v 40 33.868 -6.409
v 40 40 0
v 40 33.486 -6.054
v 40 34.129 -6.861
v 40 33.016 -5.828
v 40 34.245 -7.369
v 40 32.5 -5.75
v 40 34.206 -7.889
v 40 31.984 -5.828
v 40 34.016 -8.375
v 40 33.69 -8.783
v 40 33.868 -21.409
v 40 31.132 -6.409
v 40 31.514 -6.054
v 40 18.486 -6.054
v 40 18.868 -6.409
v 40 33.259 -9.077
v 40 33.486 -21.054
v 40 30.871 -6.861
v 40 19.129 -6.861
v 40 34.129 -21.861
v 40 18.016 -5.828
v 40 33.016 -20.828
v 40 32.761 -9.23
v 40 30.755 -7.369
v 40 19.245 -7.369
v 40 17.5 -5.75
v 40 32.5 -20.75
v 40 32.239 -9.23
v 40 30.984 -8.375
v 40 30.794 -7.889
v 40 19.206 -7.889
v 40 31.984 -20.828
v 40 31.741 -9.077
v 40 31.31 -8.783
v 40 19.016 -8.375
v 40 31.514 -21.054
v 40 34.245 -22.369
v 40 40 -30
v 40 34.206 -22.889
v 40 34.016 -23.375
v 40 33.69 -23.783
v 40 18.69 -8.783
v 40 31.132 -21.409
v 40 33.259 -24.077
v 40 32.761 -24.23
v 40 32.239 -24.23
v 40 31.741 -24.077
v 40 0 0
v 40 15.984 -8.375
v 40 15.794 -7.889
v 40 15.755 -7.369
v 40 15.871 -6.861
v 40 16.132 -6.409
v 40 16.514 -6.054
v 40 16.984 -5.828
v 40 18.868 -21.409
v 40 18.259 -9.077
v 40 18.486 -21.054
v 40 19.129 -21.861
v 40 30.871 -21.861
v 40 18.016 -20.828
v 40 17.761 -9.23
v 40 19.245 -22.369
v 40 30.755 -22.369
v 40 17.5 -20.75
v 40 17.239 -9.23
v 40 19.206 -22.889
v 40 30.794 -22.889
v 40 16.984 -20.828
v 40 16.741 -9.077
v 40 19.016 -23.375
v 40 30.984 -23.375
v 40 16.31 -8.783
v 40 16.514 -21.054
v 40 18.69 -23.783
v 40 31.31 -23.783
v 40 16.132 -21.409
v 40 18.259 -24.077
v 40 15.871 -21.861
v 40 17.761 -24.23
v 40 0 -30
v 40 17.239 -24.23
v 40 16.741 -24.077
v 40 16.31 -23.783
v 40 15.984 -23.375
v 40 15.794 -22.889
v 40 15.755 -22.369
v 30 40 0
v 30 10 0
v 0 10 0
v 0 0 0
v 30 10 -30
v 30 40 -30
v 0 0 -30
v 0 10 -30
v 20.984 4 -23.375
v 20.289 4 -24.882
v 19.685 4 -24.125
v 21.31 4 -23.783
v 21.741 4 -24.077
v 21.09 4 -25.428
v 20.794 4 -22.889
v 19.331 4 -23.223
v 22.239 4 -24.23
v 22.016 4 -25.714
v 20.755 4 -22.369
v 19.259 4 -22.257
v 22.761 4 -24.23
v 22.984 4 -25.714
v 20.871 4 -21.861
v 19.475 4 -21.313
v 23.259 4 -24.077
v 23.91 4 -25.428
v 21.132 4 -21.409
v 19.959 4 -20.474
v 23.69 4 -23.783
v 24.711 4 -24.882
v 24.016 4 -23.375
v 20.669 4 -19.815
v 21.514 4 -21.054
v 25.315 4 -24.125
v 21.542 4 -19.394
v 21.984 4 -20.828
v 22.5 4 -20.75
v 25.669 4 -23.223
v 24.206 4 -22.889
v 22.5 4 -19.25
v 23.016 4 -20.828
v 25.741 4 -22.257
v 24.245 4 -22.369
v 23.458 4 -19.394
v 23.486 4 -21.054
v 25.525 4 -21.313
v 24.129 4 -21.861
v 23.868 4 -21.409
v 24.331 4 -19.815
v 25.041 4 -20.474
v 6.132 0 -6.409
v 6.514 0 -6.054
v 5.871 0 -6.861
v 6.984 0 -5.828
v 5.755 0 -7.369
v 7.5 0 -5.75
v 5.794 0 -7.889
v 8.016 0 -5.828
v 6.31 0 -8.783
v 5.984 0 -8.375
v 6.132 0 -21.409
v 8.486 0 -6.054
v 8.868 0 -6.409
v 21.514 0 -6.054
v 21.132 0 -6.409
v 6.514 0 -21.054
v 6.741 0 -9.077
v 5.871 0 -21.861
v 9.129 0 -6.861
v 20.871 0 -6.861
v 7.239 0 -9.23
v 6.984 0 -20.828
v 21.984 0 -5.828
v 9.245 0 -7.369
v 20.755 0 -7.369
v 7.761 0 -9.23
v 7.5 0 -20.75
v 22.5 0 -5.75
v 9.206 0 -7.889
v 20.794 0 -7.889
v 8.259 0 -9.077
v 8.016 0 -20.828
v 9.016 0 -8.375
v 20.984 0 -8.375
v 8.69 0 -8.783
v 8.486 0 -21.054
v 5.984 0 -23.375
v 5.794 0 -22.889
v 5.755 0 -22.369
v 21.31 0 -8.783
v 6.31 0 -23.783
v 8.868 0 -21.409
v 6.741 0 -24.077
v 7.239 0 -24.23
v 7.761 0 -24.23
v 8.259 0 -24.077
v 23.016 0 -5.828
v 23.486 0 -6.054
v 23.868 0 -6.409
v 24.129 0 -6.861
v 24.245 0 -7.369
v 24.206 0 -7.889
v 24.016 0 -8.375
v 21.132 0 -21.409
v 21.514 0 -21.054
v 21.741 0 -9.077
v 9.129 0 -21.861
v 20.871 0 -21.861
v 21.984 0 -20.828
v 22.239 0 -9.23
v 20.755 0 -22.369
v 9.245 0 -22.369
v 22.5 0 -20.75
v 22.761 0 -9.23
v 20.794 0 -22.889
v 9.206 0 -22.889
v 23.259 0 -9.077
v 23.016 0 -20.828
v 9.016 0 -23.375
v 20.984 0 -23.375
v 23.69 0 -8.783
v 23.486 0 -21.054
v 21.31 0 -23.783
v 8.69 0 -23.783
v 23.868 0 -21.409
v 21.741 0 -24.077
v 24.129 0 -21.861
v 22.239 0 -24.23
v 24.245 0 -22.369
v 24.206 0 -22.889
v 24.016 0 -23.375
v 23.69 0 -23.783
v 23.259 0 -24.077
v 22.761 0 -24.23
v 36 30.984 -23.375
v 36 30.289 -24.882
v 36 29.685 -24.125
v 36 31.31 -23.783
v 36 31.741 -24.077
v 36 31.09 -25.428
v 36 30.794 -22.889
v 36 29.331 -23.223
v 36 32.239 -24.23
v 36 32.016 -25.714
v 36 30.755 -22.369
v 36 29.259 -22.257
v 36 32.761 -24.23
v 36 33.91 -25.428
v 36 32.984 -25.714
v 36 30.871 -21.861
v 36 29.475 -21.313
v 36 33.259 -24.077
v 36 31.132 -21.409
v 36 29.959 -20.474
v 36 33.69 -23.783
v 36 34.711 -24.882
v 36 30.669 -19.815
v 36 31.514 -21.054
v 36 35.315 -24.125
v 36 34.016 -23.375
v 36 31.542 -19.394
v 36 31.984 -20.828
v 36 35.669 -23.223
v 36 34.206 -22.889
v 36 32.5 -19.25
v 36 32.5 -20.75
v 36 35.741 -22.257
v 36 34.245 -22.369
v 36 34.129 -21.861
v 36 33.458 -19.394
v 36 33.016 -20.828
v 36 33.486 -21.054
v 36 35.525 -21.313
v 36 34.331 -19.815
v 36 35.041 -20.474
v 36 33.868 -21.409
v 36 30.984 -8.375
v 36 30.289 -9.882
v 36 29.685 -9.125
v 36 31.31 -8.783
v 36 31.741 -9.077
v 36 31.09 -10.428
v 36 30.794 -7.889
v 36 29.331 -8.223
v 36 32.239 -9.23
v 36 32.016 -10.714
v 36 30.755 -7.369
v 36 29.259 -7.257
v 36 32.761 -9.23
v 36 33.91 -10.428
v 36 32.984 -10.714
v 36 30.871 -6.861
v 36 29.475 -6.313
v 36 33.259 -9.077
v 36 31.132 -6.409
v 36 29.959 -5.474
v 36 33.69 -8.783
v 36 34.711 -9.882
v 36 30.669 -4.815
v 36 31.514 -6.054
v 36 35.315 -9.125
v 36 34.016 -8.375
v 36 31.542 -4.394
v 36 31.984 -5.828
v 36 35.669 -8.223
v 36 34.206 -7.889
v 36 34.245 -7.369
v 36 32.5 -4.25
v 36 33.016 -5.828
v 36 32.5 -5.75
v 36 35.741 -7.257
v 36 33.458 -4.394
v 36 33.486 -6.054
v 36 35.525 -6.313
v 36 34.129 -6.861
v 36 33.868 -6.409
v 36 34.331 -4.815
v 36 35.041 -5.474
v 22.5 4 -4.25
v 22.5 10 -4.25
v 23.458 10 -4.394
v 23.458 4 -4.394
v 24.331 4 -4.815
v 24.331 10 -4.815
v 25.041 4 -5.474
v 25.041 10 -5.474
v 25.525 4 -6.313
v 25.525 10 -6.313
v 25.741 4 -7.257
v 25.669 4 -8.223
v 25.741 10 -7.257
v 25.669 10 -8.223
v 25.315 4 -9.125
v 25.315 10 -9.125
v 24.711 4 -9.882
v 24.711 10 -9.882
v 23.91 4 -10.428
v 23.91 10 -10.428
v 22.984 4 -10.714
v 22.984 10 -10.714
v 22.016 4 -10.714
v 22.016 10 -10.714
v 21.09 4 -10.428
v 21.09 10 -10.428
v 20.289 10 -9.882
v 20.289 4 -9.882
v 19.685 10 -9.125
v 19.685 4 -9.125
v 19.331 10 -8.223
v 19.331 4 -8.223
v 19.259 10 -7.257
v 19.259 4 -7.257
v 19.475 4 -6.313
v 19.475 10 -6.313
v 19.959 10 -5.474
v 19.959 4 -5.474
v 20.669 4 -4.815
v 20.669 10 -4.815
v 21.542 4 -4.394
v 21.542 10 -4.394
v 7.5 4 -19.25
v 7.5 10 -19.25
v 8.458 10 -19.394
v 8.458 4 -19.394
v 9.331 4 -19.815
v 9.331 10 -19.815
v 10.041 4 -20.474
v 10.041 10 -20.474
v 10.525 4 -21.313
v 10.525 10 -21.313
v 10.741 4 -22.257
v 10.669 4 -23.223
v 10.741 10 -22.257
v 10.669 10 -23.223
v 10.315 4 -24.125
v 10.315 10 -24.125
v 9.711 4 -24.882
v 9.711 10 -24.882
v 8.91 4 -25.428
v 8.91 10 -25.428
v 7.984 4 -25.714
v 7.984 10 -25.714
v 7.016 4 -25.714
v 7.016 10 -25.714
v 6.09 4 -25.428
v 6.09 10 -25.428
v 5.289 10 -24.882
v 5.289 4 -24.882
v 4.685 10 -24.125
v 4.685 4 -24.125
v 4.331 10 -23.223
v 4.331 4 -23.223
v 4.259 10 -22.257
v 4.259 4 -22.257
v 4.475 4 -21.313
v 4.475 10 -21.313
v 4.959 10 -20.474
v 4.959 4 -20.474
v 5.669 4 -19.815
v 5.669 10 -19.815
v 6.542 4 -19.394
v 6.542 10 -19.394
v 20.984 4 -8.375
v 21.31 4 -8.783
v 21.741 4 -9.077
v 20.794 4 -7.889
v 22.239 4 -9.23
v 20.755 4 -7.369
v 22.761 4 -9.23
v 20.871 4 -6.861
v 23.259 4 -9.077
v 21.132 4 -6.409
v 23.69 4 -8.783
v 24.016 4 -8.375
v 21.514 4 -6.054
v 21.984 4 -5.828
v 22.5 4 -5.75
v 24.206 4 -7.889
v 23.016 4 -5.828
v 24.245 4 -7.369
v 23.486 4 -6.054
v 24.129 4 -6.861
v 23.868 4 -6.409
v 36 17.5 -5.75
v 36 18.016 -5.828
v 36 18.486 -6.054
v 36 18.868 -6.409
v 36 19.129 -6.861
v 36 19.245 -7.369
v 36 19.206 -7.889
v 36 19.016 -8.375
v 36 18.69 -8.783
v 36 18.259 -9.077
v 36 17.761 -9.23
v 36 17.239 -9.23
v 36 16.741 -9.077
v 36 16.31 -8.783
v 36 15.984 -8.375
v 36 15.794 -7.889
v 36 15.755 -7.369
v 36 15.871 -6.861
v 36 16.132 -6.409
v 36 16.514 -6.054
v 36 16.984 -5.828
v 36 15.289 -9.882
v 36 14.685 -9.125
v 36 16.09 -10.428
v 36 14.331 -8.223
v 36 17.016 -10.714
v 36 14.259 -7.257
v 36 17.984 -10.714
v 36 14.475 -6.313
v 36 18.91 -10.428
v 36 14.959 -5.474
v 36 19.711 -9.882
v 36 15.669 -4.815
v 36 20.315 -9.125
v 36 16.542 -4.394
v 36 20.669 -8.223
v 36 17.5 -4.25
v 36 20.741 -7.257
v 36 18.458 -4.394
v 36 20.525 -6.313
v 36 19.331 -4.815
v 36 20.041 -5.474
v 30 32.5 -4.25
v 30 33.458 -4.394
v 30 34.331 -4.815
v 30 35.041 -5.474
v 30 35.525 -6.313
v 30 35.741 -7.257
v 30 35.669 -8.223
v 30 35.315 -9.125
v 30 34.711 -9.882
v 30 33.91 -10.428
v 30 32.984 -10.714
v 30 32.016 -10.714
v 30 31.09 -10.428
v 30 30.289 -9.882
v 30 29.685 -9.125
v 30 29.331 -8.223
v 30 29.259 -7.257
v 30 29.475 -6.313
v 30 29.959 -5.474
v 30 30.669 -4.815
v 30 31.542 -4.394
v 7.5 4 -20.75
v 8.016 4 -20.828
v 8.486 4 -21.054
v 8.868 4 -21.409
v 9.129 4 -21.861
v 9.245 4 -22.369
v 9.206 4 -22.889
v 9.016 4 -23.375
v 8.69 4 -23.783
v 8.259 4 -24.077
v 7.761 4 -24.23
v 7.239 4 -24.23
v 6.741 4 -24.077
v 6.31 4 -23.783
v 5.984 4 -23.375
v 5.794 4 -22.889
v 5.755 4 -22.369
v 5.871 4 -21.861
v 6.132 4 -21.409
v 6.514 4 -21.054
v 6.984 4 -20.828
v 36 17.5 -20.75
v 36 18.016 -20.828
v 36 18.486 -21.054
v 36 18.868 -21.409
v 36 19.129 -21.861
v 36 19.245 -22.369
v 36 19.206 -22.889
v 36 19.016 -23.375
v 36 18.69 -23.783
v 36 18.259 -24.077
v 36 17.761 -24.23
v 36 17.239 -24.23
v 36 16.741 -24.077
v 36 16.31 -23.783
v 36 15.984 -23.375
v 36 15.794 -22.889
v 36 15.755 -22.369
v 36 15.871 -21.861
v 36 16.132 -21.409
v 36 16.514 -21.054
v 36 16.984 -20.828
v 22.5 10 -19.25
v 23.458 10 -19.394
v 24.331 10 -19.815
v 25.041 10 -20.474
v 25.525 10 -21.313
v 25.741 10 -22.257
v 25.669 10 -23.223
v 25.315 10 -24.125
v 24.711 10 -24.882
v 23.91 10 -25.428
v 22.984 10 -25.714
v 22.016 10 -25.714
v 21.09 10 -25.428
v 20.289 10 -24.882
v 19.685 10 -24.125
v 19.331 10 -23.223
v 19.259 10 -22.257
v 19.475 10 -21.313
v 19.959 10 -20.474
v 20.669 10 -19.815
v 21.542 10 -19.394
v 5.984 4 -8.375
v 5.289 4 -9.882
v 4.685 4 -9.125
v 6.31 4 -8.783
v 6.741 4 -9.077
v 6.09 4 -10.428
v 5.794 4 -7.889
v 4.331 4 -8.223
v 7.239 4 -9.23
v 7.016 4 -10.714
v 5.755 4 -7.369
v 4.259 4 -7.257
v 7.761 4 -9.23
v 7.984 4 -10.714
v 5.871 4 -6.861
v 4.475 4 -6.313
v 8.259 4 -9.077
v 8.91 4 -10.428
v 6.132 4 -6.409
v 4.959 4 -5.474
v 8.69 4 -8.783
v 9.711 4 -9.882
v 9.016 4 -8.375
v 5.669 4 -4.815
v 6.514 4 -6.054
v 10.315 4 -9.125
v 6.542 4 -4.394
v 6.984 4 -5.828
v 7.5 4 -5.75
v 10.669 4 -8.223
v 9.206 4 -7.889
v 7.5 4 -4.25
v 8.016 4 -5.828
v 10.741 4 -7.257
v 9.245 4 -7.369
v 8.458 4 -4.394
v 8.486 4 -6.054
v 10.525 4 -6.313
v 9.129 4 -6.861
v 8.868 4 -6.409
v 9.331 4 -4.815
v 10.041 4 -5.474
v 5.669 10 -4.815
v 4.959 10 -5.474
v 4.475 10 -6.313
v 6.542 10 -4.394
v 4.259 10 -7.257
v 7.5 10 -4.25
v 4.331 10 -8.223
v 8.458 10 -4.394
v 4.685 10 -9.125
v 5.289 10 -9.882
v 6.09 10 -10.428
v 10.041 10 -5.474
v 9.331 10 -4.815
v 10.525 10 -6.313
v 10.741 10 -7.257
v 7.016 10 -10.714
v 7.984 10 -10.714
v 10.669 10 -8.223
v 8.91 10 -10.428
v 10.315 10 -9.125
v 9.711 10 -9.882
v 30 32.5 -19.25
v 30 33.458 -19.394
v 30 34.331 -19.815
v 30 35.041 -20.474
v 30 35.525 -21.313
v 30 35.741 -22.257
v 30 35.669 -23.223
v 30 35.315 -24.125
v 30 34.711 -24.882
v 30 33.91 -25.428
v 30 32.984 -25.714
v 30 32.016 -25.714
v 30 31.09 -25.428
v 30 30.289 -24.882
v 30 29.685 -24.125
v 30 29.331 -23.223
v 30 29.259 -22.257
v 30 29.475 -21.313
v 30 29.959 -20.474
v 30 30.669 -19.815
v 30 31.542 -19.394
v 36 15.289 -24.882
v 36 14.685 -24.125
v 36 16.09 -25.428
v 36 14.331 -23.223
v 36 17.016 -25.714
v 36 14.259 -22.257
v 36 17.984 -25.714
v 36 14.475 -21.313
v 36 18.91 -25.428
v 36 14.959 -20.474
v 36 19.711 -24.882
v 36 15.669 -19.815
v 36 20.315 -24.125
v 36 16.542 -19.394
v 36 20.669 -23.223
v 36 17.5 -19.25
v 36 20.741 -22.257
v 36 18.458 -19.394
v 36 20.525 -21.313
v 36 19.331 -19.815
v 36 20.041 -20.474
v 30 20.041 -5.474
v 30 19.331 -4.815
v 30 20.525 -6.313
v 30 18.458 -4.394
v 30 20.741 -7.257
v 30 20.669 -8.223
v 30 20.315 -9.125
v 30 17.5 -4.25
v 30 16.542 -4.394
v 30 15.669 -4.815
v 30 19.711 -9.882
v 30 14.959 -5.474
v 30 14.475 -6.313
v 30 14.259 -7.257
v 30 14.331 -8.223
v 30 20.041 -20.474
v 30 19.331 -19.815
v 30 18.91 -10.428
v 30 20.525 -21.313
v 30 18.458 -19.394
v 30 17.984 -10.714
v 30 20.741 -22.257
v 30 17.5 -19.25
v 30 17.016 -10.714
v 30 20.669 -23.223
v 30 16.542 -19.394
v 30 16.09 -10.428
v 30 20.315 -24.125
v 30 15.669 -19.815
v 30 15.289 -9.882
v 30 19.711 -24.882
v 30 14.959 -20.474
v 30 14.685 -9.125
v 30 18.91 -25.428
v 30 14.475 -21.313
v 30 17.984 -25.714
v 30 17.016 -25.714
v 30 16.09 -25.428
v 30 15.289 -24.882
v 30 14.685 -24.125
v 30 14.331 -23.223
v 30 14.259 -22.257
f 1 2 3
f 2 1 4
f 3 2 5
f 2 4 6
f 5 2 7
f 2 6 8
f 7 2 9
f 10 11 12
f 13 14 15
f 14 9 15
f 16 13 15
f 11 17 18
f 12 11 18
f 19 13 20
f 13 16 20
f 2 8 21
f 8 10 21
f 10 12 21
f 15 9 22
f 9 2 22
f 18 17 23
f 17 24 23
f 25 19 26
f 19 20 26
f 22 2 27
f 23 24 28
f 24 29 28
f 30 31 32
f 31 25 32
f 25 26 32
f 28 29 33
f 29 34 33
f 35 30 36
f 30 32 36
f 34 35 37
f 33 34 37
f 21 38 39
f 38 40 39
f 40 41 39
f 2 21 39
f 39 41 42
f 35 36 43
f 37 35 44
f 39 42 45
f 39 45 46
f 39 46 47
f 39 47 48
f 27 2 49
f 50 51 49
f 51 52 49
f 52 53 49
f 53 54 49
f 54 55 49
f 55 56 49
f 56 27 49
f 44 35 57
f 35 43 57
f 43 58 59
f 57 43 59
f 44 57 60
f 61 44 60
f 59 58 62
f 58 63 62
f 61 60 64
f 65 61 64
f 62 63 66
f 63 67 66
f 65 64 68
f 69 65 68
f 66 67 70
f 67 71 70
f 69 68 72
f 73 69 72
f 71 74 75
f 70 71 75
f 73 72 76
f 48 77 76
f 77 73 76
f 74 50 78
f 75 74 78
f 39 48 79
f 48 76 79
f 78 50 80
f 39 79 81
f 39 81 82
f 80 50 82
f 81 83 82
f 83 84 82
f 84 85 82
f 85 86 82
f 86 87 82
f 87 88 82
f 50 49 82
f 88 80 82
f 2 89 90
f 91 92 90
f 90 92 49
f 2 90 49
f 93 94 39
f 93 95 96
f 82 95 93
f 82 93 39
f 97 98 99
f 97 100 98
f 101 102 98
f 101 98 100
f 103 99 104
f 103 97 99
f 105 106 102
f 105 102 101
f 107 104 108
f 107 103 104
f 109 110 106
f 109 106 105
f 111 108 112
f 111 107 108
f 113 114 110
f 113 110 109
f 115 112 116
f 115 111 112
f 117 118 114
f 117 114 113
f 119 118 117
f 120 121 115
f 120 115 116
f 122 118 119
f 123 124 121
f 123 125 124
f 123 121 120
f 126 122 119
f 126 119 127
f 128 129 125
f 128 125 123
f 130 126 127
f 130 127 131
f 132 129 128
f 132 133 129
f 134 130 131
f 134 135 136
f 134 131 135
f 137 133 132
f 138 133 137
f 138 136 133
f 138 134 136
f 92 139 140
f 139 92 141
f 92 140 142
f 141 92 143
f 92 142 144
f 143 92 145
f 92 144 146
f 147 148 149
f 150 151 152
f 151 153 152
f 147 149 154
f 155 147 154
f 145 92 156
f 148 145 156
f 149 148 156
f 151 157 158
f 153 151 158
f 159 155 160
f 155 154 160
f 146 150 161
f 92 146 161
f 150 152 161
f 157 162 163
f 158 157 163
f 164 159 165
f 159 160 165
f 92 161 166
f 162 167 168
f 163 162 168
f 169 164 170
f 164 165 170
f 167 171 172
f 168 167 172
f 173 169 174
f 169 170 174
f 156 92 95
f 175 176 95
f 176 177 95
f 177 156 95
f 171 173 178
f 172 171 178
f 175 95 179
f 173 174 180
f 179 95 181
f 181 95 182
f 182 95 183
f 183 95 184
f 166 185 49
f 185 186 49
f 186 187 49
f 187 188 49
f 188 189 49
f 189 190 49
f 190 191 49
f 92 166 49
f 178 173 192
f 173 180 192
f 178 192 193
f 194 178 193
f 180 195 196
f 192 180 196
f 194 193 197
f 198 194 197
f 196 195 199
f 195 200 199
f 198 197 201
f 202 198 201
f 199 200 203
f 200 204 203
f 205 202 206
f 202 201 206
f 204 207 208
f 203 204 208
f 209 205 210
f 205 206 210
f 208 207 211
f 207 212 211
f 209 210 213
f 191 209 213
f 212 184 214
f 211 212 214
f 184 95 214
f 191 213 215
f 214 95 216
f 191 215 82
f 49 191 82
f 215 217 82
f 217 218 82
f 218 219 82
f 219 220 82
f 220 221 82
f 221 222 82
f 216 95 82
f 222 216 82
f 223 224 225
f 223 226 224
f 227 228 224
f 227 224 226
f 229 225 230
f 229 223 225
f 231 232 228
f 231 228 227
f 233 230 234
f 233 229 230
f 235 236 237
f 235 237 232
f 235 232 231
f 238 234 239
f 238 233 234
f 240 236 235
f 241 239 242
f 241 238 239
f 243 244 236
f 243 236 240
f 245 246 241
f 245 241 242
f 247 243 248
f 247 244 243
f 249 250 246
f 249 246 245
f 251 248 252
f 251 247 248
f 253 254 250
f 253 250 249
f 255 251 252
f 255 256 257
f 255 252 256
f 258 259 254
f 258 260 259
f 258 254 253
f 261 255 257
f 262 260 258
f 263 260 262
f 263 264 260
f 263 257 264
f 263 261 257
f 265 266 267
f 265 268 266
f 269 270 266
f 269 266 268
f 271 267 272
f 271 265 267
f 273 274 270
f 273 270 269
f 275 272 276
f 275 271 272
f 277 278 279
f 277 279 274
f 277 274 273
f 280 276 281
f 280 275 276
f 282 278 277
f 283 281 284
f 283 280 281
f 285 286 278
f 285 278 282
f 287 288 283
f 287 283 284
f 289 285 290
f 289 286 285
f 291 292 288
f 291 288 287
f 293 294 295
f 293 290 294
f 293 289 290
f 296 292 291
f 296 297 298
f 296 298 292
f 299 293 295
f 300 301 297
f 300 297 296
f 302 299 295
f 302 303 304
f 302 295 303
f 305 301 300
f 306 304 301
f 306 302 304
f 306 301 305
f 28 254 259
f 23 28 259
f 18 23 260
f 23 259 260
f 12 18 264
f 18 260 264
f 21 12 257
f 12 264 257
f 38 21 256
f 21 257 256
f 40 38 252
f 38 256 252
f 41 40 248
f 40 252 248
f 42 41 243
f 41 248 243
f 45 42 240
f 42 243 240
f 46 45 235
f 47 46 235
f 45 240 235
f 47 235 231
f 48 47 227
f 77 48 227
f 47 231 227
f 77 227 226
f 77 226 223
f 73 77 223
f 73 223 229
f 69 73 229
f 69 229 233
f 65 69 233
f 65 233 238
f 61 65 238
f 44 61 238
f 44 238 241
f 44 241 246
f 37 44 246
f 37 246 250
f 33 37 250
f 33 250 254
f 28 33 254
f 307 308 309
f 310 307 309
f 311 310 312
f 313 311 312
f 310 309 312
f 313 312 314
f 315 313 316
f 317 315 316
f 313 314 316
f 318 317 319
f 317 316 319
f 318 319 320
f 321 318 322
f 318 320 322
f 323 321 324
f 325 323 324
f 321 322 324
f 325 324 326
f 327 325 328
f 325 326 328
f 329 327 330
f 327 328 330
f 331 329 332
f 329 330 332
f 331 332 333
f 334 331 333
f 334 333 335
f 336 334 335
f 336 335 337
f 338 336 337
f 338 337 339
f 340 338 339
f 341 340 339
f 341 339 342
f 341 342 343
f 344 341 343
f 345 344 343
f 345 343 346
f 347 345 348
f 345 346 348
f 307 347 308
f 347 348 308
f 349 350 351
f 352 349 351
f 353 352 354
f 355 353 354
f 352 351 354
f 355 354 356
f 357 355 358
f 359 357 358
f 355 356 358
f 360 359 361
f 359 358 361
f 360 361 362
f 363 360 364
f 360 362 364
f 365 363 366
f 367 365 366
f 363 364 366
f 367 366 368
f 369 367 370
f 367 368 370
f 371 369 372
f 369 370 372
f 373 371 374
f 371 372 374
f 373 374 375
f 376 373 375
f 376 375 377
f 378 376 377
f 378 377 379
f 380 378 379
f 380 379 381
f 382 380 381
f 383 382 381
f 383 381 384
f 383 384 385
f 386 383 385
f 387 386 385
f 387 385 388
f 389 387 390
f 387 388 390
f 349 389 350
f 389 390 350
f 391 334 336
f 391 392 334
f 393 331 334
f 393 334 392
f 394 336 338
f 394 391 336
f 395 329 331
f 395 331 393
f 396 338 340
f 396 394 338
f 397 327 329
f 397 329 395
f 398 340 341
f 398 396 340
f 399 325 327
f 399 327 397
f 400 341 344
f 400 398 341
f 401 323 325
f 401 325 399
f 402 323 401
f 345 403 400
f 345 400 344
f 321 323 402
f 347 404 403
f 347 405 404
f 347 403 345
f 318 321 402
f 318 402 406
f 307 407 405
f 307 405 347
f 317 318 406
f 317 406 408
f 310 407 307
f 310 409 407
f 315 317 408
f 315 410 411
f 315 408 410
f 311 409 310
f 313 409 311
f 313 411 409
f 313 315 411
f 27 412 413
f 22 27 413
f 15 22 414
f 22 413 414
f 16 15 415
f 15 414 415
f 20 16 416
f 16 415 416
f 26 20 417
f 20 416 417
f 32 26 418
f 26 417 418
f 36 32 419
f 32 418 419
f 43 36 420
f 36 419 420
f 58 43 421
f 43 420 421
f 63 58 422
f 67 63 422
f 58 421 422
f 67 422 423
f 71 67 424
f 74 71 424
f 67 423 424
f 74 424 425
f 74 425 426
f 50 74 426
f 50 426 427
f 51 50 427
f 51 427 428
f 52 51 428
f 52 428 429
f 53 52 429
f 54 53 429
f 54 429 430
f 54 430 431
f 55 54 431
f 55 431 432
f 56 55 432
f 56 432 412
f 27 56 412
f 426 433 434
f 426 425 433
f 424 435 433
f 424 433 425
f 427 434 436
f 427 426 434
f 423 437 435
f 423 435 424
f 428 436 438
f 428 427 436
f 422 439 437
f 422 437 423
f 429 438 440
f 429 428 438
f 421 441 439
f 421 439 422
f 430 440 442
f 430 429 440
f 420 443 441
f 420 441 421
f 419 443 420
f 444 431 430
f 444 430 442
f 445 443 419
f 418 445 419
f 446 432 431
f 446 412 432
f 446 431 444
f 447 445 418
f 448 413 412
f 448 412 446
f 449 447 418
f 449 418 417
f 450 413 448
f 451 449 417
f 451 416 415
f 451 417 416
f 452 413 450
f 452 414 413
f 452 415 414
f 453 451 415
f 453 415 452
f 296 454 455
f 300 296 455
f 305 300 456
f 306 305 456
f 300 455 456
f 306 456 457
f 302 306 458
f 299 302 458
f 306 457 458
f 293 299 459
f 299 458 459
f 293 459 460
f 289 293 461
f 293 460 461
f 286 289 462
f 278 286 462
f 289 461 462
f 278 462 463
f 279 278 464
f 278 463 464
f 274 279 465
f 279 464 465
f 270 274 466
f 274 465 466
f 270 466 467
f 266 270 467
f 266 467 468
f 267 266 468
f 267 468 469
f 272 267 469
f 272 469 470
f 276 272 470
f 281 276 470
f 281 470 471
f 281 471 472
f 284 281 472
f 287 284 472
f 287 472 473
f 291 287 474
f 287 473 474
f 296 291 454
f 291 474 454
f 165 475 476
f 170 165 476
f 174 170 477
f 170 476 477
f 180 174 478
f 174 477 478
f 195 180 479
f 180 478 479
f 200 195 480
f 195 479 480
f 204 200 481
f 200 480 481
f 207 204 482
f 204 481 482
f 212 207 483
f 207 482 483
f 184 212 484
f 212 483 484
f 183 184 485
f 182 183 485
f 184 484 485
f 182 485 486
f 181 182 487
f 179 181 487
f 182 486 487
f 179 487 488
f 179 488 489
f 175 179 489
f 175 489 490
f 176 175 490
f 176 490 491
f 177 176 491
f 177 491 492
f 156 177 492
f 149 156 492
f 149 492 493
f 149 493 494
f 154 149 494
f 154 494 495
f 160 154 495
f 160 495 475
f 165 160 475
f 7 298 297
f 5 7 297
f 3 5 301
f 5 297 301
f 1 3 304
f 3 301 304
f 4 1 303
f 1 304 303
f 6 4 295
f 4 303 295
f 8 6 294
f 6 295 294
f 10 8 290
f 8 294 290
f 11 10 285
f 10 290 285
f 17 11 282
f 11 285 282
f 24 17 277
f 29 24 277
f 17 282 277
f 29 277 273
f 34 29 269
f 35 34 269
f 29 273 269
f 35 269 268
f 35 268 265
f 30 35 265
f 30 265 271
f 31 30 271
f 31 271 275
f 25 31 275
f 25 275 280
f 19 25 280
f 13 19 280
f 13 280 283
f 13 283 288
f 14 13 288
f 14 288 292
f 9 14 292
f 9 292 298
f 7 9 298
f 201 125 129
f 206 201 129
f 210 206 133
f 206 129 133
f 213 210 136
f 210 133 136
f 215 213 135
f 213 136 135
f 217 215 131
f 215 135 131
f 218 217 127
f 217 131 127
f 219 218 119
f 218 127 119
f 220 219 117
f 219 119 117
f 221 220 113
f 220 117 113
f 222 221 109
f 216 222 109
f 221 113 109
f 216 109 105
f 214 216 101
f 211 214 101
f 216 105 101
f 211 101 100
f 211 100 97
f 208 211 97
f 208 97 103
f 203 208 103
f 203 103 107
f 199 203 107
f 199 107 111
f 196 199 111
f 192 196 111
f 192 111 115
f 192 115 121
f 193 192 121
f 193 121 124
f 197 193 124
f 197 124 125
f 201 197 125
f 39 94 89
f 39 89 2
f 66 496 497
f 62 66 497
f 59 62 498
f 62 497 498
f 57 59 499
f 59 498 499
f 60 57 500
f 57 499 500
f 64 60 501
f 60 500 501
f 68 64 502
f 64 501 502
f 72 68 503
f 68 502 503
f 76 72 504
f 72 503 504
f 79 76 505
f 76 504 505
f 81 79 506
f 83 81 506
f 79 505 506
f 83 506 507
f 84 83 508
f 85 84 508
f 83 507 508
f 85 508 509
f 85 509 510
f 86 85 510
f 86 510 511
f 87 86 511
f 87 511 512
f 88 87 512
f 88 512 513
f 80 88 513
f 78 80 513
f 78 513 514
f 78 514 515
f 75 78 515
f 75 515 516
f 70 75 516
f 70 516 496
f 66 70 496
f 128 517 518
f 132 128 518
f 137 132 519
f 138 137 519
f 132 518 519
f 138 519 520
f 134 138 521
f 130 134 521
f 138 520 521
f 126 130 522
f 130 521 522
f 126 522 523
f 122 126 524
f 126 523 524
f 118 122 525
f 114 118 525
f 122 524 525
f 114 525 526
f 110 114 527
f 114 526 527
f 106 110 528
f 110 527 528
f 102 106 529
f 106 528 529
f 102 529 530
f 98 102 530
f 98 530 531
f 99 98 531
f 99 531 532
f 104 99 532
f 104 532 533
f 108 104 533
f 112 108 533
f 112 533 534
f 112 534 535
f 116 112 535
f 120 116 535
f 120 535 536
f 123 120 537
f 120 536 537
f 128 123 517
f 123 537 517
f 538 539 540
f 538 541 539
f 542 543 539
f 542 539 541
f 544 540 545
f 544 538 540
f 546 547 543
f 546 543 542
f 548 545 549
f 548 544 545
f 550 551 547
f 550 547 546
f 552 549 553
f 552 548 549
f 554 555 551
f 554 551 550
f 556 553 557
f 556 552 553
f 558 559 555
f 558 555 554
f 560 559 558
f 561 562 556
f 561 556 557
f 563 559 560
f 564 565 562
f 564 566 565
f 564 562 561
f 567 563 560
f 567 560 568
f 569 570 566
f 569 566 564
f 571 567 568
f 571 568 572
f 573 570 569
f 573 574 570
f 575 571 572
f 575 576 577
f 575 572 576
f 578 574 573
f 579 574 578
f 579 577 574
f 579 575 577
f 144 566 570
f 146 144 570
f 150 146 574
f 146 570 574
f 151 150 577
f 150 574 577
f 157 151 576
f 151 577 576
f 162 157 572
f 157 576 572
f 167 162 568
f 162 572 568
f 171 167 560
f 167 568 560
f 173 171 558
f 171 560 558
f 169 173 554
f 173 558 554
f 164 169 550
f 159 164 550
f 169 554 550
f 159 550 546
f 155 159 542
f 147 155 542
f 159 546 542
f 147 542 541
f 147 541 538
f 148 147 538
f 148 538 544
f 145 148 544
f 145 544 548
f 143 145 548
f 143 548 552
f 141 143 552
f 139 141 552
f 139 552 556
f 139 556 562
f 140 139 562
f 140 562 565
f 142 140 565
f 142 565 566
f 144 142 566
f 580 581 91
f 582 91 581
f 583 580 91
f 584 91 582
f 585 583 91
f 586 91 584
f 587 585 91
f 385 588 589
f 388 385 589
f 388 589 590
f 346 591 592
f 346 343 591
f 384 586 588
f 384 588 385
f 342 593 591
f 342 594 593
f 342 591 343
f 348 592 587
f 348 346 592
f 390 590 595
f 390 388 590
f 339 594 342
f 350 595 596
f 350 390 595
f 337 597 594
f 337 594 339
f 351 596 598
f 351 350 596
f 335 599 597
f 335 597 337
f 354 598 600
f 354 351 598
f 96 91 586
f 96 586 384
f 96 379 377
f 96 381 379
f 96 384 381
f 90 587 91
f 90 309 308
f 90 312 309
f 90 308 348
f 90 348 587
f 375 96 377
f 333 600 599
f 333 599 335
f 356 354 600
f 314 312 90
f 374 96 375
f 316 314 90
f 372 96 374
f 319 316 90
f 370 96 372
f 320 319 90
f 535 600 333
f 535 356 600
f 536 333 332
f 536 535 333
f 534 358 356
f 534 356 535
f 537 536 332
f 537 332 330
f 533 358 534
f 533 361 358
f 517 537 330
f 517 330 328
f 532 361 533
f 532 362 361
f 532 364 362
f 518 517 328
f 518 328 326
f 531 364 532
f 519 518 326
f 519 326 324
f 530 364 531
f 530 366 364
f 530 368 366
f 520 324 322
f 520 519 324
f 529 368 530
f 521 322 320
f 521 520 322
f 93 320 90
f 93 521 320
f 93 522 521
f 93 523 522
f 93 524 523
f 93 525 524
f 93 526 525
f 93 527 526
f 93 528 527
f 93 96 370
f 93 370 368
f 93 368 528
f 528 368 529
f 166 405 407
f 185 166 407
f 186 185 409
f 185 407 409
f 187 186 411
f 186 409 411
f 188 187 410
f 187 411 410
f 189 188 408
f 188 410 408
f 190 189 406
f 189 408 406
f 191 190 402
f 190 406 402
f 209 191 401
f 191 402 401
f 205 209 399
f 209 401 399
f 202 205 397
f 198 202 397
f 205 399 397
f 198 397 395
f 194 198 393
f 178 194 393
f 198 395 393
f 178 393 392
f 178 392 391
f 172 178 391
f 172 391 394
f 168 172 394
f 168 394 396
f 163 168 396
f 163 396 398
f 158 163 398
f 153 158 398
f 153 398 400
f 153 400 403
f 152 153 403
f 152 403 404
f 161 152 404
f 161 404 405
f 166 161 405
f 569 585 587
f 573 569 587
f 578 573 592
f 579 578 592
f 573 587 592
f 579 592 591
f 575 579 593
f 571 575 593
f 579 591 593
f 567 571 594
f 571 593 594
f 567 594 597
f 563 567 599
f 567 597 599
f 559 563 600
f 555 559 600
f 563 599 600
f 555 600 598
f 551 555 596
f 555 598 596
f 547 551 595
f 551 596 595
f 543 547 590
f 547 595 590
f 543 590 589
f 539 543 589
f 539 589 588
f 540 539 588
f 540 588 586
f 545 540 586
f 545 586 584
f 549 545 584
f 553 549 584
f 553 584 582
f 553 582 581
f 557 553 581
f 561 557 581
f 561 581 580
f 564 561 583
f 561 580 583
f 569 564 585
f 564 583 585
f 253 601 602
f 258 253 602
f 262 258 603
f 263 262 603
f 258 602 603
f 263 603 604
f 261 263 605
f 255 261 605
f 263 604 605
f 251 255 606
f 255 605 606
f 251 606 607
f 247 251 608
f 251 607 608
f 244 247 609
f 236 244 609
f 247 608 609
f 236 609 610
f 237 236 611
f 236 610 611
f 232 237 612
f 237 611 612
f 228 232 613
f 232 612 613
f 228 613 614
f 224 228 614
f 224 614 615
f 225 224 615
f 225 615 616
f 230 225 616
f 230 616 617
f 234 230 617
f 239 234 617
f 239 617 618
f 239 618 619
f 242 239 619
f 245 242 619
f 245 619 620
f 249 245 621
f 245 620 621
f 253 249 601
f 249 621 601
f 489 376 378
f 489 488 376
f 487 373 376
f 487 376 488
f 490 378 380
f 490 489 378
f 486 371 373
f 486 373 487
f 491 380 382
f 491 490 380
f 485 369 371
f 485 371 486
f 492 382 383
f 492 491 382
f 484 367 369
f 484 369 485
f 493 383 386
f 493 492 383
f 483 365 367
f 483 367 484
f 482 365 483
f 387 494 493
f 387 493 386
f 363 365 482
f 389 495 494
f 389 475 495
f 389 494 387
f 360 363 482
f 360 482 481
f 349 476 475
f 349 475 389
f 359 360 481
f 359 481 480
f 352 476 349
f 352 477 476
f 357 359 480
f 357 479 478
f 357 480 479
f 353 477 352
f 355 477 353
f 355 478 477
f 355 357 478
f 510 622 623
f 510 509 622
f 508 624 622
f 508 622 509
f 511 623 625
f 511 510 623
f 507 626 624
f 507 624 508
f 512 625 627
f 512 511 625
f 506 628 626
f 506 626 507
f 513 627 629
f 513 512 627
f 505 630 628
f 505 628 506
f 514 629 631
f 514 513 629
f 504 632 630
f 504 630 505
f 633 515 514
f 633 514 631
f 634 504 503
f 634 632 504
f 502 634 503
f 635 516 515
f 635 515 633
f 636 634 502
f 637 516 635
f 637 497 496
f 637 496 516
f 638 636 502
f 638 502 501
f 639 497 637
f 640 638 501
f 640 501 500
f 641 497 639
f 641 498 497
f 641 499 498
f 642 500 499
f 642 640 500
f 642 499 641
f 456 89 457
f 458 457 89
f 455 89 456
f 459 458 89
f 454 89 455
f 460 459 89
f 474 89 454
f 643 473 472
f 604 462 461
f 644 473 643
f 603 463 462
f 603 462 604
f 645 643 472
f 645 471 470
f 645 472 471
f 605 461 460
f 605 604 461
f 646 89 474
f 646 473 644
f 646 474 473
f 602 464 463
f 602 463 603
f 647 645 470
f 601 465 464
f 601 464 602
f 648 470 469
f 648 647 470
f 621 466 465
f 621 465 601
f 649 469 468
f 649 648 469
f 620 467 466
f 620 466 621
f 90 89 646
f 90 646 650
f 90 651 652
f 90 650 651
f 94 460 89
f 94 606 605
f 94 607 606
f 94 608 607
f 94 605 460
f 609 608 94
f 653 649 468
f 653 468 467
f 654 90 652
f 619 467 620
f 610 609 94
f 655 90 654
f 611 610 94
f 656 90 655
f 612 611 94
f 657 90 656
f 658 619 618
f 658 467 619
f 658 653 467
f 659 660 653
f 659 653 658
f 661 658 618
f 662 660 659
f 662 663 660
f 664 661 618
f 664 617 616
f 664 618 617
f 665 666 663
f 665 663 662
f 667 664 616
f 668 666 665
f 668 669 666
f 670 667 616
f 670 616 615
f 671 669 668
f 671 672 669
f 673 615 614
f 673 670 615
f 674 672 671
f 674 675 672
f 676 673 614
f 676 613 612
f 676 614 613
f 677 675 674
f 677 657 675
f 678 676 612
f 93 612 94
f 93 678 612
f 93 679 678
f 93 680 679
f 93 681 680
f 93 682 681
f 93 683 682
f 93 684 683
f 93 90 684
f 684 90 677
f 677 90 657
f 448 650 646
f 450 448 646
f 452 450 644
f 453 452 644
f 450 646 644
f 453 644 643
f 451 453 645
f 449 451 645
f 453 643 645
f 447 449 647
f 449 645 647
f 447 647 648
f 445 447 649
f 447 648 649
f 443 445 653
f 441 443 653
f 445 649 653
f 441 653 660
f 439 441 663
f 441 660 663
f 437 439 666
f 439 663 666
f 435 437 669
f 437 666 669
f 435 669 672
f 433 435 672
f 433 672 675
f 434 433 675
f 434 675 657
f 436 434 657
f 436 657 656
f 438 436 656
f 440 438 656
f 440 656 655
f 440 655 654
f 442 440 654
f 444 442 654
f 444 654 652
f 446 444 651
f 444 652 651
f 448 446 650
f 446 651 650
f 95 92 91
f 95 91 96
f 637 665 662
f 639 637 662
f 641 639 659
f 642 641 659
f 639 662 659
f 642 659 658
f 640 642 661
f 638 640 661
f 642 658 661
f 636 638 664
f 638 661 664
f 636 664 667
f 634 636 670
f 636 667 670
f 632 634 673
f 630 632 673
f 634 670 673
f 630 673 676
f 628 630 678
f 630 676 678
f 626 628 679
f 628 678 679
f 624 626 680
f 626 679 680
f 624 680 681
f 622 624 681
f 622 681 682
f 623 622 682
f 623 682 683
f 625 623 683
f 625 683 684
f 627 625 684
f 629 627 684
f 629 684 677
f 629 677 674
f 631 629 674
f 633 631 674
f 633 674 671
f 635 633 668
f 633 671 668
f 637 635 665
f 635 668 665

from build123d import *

# Parameters (mm, degrees)
ESBO_O1_W                = 40
ESBO_O1_H                = 30
RESSALTO_EXTRUS_O1_DEPTH = 10
ESBO_O2_W                = 10
ESBO_O2_H                = 30
RESSALTO_EXTRUS_O2_DEPTH = 30
ESBO_O4_R                = 3.25
CORTE_EXTRUS_O1_DEPTH    = 6
ESBO_O5_R                = 1.75
CORTE_EXTRUS_O2_DEPTH    = 10
ESBO_O6_R                = 3.25
CORTE_EXTRUS_O3_DEPTH    = 6
ESBO_O7_R                = 1.75
CORTE_EXTRUS_O4_DEPTH    = 10


with BuildPart() as part:
    # Esboço1 → Ressalto-extrusão1 (new body)
    with BuildSketch(Plane(origin=(0, 0, 0), x_dir=(1, 0, 0), z_dir=(0, 1, 0))):
        with Locations((20, 15)):
            Rectangle(ESBO_O1_W, ESBO_O1_H)
    extrude(amount=RESSALTO_EXTRUS_O1_DEPTH)

    # Esboço2 → Ressalto-extrusão2 (add)
    with BuildSketch(Plane(origin=(0, 10, 0), x_dir=(1, 0, 0), z_dir=(0, 1, 0))):
        with Locations((35, 15)):
            Rectangle(ESBO_O2_W, ESBO_O2_H)
    extrude(amount=RESSALTO_EXTRUS_O2_DEPTH)

    # Esboço4 → Corte-extrusão1 (cut)
    with BuildSketch(Plane(origin=(0, 10, 0), x_dir=(1, 0, 0), z_dir=(0, 1, 0))):
        with Locations(Location((7.5, 22.5, 0), (0, 0, 270))):
            Circle(ESBO_O4_R)
        with Locations(Location((22.5, 22.5, 0), (0, 0, 270))):
            Circle(ESBO_O4_R)
        with Locations(Location((22.5, 7.5, 0), (0, 0, 270))):
            Circle(ESBO_O4_R)
        with Locations(Location((7.5, 7.5, 0), (0, 0, 270))):
            Circle(ESBO_O4_R)
    extrude(amount=-CORTE_EXTRUS_O1_DEPTH, mode=Mode.SUBTRACT)

    # Esboço5 → Corte-extrusão2 (cut)
    with BuildSketch(Plane(origin=(0, 10, 0), x_dir=(1, 0, 0), z_dir=(0, 1, 0))):
        with Locations(Location((7.5, 22.5, 0), (0, 0, 270))):
            Circle(ESBO_O5_R)
        with Locations(Location((22.5, 22.5, 0), (0, 0, 270))):
            Circle(ESBO_O5_R)
        with Locations(Location((22.5, 7.5, 0), (0, 0, 270))):
            Circle(ESBO_O5_R)
        with Locations(Location((7.5, 7.5, 0), (0, 0, 270))):
            Circle(ESBO_O5_R)
    extrude(amount=-CORTE_EXTRUS_O2_DEPTH, mode=Mode.SUBTRACT)

    # Esboço6 → Corte-extrusão3 (cut)
    with BuildSketch(Plane.ZY.offset(-30)):
        with Locations((-7.5, 32.5)):
            Circle(ESBO_O6_R)
        with Locations((-22.5, 32.5)):
            Circle(ESBO_O6_R)
        with Locations((-22.5, 17.5)):
            Circle(ESBO_O6_R)
        with Locations((-7.5, 17.5)):
            Circle(ESBO_O6_R)
    extrude(amount=-CORTE_EXTRUS_O3_DEPTH, mode=Mode.SUBTRACT)

    # Esboço7 → Corte-extrusão4 (cut)
    with BuildSketch(Plane.ZY.offset(-30)):
        with Locations((-22.5, 32.5)):
            Circle(ESBO_O7_R)
        with Locations((-7.5, 32.5)):
            Circle(ESBO_O7_R)
        with Locations((-7.5, 17.5)):
            Circle(ESBO_O7_R)
        with Locations((-22.5, 17.5)):
            Circle(ESBO_O7_R)
    extrude(amount=-CORTE_EXTRUS_O4_DEPTH, mode=Mode.SUBTRACT)


solid = part.part
